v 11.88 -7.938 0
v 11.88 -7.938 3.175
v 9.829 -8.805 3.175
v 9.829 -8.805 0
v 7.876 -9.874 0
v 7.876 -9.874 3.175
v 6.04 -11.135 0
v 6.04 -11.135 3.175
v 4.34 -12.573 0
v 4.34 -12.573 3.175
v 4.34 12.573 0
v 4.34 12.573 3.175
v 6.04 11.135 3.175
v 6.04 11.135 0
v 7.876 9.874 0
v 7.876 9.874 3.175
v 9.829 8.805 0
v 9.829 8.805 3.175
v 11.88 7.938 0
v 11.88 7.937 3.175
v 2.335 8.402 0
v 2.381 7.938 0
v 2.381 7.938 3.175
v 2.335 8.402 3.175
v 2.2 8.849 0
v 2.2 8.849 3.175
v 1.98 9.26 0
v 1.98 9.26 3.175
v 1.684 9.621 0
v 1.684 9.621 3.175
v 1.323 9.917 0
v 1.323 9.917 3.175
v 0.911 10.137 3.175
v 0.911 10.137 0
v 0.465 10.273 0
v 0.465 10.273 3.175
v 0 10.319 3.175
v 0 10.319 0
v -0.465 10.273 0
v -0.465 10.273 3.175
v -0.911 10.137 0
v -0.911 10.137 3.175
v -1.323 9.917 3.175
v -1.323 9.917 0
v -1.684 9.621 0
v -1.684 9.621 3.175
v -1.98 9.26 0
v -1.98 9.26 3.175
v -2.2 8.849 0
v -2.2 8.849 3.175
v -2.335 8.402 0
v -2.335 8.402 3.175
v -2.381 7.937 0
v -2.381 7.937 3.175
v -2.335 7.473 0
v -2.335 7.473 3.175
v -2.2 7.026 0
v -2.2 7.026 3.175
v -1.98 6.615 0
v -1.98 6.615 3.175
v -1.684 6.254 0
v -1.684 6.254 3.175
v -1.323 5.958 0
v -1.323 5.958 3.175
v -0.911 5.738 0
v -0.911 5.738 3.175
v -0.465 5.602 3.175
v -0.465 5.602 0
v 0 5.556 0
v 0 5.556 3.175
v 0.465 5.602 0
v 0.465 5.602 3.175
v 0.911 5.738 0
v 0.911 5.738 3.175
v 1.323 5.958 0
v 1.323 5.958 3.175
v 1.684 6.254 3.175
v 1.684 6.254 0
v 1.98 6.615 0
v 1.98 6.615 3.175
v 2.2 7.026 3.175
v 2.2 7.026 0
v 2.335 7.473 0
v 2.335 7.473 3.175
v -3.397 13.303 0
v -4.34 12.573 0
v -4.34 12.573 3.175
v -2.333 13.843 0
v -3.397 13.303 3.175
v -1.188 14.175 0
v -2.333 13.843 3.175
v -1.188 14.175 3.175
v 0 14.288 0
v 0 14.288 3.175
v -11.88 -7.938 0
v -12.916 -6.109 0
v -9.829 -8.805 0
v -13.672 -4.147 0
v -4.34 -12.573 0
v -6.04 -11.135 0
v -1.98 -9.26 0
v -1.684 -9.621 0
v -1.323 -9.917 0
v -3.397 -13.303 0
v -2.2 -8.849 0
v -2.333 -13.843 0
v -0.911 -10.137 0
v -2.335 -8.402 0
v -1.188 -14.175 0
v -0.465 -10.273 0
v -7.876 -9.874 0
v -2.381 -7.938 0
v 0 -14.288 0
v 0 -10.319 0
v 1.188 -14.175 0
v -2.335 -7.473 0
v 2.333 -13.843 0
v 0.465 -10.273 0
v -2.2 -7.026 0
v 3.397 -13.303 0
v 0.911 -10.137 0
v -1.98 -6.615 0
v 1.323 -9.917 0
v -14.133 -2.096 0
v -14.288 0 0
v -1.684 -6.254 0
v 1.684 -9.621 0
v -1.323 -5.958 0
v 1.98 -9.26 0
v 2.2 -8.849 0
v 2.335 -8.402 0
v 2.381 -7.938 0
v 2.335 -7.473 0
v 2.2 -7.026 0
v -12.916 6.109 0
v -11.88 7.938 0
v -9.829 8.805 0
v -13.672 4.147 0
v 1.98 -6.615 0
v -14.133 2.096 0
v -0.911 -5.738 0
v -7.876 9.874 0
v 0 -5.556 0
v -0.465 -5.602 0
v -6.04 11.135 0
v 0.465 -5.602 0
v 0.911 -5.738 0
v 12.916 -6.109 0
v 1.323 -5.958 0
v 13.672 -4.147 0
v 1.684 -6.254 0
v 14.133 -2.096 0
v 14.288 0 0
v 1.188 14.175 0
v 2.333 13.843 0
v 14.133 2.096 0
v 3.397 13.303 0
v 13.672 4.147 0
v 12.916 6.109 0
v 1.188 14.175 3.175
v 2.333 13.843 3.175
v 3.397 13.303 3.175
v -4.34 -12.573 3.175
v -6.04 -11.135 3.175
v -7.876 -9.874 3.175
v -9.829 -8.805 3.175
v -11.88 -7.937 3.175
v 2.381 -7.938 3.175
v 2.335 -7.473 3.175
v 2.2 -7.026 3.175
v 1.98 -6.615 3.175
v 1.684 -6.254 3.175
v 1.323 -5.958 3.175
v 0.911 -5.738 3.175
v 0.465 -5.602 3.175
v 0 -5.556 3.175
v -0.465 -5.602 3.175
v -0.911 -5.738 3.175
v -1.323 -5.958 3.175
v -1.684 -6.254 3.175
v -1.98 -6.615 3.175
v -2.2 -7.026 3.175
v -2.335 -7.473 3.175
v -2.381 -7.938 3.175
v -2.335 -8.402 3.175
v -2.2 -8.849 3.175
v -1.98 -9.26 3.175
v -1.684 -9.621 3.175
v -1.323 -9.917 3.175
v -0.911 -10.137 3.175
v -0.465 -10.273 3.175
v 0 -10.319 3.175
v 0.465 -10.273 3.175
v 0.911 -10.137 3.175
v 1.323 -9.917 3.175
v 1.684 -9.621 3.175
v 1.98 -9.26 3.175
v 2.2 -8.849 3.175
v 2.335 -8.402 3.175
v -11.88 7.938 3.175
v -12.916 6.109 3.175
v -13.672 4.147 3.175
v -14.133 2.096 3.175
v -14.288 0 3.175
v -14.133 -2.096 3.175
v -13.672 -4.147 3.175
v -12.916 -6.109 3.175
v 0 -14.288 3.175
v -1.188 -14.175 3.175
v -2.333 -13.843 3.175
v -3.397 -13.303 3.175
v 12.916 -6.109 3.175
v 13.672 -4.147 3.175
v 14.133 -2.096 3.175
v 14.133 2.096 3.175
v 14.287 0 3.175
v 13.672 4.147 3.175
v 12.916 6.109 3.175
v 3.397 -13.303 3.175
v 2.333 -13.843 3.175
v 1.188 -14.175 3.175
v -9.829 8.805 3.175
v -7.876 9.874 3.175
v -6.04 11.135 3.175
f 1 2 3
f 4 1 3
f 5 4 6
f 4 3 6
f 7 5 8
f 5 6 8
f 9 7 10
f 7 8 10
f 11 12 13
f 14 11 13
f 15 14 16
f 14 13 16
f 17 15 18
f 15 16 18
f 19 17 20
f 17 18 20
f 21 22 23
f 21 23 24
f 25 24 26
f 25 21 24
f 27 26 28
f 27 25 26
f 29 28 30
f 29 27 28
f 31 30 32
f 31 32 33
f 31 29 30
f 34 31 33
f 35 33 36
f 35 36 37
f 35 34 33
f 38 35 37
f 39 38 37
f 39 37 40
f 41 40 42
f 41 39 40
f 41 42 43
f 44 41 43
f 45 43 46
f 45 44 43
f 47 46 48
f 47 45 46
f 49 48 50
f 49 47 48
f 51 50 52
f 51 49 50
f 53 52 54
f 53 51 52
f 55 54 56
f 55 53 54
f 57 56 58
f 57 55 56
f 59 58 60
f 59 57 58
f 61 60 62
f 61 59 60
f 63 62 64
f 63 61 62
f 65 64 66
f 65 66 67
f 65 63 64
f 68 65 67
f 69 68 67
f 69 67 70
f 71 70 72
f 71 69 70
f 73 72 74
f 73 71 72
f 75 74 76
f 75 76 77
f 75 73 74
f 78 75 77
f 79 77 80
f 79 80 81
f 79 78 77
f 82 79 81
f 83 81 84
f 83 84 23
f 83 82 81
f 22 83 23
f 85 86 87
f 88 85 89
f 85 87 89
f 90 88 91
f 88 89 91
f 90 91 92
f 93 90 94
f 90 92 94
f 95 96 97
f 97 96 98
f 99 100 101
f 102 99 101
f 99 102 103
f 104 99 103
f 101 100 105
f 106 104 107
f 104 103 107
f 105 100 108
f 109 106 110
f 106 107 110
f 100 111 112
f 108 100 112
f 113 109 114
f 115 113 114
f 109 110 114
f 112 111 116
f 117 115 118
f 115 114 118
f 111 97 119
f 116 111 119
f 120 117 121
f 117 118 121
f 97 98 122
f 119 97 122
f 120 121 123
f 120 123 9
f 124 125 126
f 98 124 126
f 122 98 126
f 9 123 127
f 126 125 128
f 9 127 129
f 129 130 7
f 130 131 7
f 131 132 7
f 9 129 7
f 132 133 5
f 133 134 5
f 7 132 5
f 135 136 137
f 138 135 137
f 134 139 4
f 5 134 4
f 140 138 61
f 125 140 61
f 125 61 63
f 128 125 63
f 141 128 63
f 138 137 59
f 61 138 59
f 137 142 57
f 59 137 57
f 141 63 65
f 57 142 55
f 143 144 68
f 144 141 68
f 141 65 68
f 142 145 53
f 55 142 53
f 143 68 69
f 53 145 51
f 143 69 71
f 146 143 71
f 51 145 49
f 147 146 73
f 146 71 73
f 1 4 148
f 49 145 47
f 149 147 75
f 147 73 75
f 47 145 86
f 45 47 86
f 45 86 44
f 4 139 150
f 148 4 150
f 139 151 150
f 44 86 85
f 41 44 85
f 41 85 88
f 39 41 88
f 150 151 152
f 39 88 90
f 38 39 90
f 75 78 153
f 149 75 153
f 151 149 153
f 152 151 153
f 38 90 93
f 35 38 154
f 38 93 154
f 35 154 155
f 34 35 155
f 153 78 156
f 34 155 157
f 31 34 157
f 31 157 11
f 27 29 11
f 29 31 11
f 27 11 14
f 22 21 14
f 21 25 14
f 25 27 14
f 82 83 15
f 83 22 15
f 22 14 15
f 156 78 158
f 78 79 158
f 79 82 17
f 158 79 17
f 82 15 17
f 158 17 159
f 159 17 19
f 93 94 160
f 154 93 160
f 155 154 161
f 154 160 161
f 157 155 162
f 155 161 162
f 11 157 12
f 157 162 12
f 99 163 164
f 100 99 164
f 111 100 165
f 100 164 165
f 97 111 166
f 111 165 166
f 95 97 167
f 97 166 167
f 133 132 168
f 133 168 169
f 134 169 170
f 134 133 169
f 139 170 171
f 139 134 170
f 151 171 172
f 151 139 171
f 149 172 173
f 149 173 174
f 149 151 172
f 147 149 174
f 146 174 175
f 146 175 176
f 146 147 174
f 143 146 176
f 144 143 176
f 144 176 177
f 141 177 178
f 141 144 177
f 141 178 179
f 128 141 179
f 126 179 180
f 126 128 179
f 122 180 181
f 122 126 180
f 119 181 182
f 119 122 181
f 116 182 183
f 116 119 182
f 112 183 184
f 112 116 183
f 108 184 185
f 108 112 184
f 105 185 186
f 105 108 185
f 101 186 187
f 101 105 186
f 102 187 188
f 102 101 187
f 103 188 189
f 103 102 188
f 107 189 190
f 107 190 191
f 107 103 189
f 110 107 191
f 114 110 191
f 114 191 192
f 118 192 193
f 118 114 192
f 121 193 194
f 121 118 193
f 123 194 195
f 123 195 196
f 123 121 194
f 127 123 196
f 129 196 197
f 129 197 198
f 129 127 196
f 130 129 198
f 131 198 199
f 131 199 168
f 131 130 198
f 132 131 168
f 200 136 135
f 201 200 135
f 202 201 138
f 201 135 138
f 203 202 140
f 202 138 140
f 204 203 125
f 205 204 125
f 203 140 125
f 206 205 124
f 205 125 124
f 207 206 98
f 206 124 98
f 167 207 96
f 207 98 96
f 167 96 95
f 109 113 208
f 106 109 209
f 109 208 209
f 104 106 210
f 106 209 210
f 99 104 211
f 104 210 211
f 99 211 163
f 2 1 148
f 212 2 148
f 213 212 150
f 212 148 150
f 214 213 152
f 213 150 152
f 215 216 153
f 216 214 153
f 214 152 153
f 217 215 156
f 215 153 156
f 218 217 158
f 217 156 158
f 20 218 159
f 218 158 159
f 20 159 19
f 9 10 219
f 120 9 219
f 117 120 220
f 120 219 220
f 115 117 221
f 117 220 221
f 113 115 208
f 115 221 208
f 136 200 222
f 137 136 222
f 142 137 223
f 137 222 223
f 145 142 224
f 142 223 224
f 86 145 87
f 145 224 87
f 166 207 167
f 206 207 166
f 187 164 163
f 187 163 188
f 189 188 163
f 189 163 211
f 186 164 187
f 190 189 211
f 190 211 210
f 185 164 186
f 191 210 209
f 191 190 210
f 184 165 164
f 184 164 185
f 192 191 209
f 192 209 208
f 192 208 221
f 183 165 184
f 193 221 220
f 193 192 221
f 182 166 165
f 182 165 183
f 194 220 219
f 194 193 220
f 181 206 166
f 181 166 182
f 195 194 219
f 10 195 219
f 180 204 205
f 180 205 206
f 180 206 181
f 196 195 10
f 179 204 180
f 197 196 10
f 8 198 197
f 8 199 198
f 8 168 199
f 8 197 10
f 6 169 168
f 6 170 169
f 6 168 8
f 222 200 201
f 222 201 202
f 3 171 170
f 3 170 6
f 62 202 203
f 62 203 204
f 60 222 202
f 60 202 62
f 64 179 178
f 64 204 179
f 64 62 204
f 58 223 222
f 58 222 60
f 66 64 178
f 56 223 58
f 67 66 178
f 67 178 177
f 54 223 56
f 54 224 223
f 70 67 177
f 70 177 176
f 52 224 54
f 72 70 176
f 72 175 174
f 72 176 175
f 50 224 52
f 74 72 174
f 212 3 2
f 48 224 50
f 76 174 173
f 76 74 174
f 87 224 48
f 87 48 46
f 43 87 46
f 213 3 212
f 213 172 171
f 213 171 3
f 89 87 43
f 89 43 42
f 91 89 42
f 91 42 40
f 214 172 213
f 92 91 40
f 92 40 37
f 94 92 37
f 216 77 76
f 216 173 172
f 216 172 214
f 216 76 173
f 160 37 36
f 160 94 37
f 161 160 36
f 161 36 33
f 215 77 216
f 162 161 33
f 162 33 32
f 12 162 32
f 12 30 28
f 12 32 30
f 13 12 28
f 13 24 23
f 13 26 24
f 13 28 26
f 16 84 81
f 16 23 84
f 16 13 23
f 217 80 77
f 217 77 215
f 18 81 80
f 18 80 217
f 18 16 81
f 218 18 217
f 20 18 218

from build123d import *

# Parameters (mm, degrees)
SKETCH1_R           = 14.2875
SKETCH1_R_2         = 2.38125
BOSS_EXTRUDE1_DEPTH = 3.175
SKETCH2_R           = 18.832202279
SKETCH2_R_2         = 14.2875
CUT_EXTRUDE1_DEPTH  = 21.453506729


with BuildPart() as part:
    # Sketch1 → Boss-Extrude1 (new body)
    with BuildSketch(Plane.XY):
        Circle(SKETCH1_R)
        with Locations((0, 7.9375)):
            Circle(SKETCH1_R_2, mode=Mode.SUBTRACT)
        with Locations((0, -7.9375)):
            Circle(SKETCH1_R_2, mode=Mode.SUBTRACT)
    extrude(amount=BOSS_EXTRUDE1_DEPTH)

    # Sketch2 → Cut-Extrude1 (cut, through all)
    # profile 1 of 5: a face of its own
    with BuildSketch(Plane.XY.offset(3.175)):
        Circle(SKETCH2_R)
        Circle(SKETCH2_R_2, mode=Mode.SUBTRACT)
    # profile 2 of 5: a face of its own
    with BuildSketch(Plane.XY.offset(3.175)):
        with BuildLine():
            ThreePointArc((4.340071127, 12.572829828), (7.875864823, 9.874463076), (11.879762203, 7.9375))
            ThreePointArc((11.879762203, 7.9375), (6.735192091, 12.600390619), (0, 14.2875))
            ThreePointArc((0, 14.2875), (2.333254764, 13.843295645), (4.340071127, 12.572829828))
        make_face()
    # profile 3 of 5: a face of its own
    with BuildSketch(Plane.XY.offset(3.175)):
        with BuildLine():
            ThreePointArc((7.3e-08, -14.2875), (6.735192123, -12.600390602), (11.879762203, -7.9375))
            ThreePointArc((11.879762203, -7.9375), (7.875864823, -9.874463076), (4.340071127, -12.572829828))
            ThreePointArc((4.340071127, -12.572829828), (2.333254798, -13.843295632), (7.3e-08, -14.2875))
        make_face()
    # profile 4 of 5: a face of its own
    with BuildSketch(Plane.XY.offset(3.175)):
        with BuildLine():
            ThreePointArc((-11.879762203, -7.9375), (-6.735192059, -12.600390636), (7.3e-08, -14.2875))
            ThreePointArc((7.3e-08, -14.2875), (-2.33325473, -13.843295659), (-4.340071127, -12.572829828))
            ThreePointArc((-4.340071127, -12.572829828), (-7.875864823, -9.874463076), (-11.879762203, -7.9375))
        make_face()
    # profile 5 of 5: a face of its own
    with BuildSketch(Plane.XY.offset(3.175)):
        with BuildLine():
            ThreePointArc((-4.340071127, 12.572829828), (-2.333254764, 13.843295645), (0, 14.2875))
            ThreePointArc((0, 14.2875), (-6.735192091, 12.600390619), (-11.879762203, 7.9375))
            ThreePointArc((-11.879762203, 7.9375), (-7.875864823, 9.874463076), (-4.340071127, 12.572829828))
        make_face()
    extrude(amount=-CUT_EXTRUDE1_DEPTH, mode=Mode.SUBTRACT)


solid = part.part
